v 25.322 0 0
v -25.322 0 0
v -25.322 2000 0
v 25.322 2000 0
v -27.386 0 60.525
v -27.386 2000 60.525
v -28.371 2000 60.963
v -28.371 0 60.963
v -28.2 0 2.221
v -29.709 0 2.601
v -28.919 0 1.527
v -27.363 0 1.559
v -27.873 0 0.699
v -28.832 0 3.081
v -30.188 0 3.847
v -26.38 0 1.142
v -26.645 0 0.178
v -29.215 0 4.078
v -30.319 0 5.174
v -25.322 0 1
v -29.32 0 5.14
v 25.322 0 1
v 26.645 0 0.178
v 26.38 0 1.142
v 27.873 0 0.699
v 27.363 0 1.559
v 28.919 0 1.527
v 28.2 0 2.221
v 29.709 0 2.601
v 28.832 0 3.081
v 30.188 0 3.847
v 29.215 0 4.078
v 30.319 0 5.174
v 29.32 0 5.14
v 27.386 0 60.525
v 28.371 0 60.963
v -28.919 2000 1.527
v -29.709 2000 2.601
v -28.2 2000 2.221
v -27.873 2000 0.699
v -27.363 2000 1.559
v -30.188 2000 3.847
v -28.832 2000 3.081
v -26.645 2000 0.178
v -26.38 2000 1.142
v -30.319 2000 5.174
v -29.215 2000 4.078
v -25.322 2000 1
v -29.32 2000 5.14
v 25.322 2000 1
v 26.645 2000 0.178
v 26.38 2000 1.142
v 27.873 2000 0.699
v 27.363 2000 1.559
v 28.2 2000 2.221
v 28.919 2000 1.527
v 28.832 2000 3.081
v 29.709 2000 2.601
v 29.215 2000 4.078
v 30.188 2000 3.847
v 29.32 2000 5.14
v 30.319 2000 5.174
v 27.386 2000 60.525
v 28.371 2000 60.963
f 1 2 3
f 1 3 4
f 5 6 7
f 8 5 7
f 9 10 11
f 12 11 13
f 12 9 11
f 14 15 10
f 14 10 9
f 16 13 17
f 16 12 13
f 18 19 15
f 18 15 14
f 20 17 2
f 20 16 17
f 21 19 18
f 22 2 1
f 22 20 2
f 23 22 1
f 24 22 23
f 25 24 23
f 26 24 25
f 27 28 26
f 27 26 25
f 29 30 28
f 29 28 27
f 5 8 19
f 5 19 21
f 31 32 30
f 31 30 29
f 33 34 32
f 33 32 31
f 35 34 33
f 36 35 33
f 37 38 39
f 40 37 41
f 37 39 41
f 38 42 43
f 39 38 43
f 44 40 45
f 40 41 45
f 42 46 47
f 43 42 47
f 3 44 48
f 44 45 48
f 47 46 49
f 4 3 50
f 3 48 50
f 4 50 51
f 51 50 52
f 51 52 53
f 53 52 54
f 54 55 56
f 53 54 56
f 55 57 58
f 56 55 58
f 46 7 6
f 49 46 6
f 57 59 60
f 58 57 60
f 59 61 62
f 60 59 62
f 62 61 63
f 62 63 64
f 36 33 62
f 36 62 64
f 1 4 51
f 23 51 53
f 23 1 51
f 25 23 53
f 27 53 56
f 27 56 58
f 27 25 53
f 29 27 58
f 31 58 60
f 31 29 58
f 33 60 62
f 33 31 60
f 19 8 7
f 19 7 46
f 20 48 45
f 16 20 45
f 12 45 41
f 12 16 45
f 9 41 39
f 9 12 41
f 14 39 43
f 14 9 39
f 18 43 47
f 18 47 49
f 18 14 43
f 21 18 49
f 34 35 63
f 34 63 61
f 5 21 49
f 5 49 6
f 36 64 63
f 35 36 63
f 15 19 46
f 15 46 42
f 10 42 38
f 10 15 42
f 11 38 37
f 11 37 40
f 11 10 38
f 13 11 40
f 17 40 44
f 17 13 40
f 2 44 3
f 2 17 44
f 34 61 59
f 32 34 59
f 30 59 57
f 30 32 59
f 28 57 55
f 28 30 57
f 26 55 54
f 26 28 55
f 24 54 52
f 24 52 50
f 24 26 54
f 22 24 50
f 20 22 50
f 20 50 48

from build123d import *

# Parameters (mm, degrees)
F1_DEPTH = 2000


with BuildPart() as f1:
    # F0 (on Front) → F1 (new body)
    with BuildSketch(Plane.XZ):
        with BuildLine():
            Line((-25.322348, 0), (0, 0))
            Line((0, 0), (25.322348, 0))
            ThreePointArc((25.322348, 0), (28.919047, 1.526708), (30.319303, 5.174497))
            Line((30.319303, 5.174497), (28.371131, 60.96284))
            Line((28.371131, 60.96284), (27.385817, 60.524813))
            Line((27.385817, 60.524813), (29.319912, 5.139598))
            ThreePointArc((29.319912, 5.139598), (28.199708, 2.221367), (25.322348, 1))
            Line((25.322348, 1), (0, 1))
            Line((0, 1), (-25.322348, 1))
            ThreePointArc((-25.322348, 1), (-28.199708, 2.221367), (-29.319912, 5.139598))
            Line((-29.319912, 5.139598), (-27.385817, 60.524813))
            Line((-27.385817, 60.524813), (-28.371131, 60.96284))
            Line((-28.371131, 60.96284), (-30.319303, 5.174497))
            ThreePointArc((-30.319303, 5.174497), (-28.919047, 1.526708), (-25.322348, 0))
        make_face()
    extrude(amount=-F1_DEPTH)


solid = f1.part
